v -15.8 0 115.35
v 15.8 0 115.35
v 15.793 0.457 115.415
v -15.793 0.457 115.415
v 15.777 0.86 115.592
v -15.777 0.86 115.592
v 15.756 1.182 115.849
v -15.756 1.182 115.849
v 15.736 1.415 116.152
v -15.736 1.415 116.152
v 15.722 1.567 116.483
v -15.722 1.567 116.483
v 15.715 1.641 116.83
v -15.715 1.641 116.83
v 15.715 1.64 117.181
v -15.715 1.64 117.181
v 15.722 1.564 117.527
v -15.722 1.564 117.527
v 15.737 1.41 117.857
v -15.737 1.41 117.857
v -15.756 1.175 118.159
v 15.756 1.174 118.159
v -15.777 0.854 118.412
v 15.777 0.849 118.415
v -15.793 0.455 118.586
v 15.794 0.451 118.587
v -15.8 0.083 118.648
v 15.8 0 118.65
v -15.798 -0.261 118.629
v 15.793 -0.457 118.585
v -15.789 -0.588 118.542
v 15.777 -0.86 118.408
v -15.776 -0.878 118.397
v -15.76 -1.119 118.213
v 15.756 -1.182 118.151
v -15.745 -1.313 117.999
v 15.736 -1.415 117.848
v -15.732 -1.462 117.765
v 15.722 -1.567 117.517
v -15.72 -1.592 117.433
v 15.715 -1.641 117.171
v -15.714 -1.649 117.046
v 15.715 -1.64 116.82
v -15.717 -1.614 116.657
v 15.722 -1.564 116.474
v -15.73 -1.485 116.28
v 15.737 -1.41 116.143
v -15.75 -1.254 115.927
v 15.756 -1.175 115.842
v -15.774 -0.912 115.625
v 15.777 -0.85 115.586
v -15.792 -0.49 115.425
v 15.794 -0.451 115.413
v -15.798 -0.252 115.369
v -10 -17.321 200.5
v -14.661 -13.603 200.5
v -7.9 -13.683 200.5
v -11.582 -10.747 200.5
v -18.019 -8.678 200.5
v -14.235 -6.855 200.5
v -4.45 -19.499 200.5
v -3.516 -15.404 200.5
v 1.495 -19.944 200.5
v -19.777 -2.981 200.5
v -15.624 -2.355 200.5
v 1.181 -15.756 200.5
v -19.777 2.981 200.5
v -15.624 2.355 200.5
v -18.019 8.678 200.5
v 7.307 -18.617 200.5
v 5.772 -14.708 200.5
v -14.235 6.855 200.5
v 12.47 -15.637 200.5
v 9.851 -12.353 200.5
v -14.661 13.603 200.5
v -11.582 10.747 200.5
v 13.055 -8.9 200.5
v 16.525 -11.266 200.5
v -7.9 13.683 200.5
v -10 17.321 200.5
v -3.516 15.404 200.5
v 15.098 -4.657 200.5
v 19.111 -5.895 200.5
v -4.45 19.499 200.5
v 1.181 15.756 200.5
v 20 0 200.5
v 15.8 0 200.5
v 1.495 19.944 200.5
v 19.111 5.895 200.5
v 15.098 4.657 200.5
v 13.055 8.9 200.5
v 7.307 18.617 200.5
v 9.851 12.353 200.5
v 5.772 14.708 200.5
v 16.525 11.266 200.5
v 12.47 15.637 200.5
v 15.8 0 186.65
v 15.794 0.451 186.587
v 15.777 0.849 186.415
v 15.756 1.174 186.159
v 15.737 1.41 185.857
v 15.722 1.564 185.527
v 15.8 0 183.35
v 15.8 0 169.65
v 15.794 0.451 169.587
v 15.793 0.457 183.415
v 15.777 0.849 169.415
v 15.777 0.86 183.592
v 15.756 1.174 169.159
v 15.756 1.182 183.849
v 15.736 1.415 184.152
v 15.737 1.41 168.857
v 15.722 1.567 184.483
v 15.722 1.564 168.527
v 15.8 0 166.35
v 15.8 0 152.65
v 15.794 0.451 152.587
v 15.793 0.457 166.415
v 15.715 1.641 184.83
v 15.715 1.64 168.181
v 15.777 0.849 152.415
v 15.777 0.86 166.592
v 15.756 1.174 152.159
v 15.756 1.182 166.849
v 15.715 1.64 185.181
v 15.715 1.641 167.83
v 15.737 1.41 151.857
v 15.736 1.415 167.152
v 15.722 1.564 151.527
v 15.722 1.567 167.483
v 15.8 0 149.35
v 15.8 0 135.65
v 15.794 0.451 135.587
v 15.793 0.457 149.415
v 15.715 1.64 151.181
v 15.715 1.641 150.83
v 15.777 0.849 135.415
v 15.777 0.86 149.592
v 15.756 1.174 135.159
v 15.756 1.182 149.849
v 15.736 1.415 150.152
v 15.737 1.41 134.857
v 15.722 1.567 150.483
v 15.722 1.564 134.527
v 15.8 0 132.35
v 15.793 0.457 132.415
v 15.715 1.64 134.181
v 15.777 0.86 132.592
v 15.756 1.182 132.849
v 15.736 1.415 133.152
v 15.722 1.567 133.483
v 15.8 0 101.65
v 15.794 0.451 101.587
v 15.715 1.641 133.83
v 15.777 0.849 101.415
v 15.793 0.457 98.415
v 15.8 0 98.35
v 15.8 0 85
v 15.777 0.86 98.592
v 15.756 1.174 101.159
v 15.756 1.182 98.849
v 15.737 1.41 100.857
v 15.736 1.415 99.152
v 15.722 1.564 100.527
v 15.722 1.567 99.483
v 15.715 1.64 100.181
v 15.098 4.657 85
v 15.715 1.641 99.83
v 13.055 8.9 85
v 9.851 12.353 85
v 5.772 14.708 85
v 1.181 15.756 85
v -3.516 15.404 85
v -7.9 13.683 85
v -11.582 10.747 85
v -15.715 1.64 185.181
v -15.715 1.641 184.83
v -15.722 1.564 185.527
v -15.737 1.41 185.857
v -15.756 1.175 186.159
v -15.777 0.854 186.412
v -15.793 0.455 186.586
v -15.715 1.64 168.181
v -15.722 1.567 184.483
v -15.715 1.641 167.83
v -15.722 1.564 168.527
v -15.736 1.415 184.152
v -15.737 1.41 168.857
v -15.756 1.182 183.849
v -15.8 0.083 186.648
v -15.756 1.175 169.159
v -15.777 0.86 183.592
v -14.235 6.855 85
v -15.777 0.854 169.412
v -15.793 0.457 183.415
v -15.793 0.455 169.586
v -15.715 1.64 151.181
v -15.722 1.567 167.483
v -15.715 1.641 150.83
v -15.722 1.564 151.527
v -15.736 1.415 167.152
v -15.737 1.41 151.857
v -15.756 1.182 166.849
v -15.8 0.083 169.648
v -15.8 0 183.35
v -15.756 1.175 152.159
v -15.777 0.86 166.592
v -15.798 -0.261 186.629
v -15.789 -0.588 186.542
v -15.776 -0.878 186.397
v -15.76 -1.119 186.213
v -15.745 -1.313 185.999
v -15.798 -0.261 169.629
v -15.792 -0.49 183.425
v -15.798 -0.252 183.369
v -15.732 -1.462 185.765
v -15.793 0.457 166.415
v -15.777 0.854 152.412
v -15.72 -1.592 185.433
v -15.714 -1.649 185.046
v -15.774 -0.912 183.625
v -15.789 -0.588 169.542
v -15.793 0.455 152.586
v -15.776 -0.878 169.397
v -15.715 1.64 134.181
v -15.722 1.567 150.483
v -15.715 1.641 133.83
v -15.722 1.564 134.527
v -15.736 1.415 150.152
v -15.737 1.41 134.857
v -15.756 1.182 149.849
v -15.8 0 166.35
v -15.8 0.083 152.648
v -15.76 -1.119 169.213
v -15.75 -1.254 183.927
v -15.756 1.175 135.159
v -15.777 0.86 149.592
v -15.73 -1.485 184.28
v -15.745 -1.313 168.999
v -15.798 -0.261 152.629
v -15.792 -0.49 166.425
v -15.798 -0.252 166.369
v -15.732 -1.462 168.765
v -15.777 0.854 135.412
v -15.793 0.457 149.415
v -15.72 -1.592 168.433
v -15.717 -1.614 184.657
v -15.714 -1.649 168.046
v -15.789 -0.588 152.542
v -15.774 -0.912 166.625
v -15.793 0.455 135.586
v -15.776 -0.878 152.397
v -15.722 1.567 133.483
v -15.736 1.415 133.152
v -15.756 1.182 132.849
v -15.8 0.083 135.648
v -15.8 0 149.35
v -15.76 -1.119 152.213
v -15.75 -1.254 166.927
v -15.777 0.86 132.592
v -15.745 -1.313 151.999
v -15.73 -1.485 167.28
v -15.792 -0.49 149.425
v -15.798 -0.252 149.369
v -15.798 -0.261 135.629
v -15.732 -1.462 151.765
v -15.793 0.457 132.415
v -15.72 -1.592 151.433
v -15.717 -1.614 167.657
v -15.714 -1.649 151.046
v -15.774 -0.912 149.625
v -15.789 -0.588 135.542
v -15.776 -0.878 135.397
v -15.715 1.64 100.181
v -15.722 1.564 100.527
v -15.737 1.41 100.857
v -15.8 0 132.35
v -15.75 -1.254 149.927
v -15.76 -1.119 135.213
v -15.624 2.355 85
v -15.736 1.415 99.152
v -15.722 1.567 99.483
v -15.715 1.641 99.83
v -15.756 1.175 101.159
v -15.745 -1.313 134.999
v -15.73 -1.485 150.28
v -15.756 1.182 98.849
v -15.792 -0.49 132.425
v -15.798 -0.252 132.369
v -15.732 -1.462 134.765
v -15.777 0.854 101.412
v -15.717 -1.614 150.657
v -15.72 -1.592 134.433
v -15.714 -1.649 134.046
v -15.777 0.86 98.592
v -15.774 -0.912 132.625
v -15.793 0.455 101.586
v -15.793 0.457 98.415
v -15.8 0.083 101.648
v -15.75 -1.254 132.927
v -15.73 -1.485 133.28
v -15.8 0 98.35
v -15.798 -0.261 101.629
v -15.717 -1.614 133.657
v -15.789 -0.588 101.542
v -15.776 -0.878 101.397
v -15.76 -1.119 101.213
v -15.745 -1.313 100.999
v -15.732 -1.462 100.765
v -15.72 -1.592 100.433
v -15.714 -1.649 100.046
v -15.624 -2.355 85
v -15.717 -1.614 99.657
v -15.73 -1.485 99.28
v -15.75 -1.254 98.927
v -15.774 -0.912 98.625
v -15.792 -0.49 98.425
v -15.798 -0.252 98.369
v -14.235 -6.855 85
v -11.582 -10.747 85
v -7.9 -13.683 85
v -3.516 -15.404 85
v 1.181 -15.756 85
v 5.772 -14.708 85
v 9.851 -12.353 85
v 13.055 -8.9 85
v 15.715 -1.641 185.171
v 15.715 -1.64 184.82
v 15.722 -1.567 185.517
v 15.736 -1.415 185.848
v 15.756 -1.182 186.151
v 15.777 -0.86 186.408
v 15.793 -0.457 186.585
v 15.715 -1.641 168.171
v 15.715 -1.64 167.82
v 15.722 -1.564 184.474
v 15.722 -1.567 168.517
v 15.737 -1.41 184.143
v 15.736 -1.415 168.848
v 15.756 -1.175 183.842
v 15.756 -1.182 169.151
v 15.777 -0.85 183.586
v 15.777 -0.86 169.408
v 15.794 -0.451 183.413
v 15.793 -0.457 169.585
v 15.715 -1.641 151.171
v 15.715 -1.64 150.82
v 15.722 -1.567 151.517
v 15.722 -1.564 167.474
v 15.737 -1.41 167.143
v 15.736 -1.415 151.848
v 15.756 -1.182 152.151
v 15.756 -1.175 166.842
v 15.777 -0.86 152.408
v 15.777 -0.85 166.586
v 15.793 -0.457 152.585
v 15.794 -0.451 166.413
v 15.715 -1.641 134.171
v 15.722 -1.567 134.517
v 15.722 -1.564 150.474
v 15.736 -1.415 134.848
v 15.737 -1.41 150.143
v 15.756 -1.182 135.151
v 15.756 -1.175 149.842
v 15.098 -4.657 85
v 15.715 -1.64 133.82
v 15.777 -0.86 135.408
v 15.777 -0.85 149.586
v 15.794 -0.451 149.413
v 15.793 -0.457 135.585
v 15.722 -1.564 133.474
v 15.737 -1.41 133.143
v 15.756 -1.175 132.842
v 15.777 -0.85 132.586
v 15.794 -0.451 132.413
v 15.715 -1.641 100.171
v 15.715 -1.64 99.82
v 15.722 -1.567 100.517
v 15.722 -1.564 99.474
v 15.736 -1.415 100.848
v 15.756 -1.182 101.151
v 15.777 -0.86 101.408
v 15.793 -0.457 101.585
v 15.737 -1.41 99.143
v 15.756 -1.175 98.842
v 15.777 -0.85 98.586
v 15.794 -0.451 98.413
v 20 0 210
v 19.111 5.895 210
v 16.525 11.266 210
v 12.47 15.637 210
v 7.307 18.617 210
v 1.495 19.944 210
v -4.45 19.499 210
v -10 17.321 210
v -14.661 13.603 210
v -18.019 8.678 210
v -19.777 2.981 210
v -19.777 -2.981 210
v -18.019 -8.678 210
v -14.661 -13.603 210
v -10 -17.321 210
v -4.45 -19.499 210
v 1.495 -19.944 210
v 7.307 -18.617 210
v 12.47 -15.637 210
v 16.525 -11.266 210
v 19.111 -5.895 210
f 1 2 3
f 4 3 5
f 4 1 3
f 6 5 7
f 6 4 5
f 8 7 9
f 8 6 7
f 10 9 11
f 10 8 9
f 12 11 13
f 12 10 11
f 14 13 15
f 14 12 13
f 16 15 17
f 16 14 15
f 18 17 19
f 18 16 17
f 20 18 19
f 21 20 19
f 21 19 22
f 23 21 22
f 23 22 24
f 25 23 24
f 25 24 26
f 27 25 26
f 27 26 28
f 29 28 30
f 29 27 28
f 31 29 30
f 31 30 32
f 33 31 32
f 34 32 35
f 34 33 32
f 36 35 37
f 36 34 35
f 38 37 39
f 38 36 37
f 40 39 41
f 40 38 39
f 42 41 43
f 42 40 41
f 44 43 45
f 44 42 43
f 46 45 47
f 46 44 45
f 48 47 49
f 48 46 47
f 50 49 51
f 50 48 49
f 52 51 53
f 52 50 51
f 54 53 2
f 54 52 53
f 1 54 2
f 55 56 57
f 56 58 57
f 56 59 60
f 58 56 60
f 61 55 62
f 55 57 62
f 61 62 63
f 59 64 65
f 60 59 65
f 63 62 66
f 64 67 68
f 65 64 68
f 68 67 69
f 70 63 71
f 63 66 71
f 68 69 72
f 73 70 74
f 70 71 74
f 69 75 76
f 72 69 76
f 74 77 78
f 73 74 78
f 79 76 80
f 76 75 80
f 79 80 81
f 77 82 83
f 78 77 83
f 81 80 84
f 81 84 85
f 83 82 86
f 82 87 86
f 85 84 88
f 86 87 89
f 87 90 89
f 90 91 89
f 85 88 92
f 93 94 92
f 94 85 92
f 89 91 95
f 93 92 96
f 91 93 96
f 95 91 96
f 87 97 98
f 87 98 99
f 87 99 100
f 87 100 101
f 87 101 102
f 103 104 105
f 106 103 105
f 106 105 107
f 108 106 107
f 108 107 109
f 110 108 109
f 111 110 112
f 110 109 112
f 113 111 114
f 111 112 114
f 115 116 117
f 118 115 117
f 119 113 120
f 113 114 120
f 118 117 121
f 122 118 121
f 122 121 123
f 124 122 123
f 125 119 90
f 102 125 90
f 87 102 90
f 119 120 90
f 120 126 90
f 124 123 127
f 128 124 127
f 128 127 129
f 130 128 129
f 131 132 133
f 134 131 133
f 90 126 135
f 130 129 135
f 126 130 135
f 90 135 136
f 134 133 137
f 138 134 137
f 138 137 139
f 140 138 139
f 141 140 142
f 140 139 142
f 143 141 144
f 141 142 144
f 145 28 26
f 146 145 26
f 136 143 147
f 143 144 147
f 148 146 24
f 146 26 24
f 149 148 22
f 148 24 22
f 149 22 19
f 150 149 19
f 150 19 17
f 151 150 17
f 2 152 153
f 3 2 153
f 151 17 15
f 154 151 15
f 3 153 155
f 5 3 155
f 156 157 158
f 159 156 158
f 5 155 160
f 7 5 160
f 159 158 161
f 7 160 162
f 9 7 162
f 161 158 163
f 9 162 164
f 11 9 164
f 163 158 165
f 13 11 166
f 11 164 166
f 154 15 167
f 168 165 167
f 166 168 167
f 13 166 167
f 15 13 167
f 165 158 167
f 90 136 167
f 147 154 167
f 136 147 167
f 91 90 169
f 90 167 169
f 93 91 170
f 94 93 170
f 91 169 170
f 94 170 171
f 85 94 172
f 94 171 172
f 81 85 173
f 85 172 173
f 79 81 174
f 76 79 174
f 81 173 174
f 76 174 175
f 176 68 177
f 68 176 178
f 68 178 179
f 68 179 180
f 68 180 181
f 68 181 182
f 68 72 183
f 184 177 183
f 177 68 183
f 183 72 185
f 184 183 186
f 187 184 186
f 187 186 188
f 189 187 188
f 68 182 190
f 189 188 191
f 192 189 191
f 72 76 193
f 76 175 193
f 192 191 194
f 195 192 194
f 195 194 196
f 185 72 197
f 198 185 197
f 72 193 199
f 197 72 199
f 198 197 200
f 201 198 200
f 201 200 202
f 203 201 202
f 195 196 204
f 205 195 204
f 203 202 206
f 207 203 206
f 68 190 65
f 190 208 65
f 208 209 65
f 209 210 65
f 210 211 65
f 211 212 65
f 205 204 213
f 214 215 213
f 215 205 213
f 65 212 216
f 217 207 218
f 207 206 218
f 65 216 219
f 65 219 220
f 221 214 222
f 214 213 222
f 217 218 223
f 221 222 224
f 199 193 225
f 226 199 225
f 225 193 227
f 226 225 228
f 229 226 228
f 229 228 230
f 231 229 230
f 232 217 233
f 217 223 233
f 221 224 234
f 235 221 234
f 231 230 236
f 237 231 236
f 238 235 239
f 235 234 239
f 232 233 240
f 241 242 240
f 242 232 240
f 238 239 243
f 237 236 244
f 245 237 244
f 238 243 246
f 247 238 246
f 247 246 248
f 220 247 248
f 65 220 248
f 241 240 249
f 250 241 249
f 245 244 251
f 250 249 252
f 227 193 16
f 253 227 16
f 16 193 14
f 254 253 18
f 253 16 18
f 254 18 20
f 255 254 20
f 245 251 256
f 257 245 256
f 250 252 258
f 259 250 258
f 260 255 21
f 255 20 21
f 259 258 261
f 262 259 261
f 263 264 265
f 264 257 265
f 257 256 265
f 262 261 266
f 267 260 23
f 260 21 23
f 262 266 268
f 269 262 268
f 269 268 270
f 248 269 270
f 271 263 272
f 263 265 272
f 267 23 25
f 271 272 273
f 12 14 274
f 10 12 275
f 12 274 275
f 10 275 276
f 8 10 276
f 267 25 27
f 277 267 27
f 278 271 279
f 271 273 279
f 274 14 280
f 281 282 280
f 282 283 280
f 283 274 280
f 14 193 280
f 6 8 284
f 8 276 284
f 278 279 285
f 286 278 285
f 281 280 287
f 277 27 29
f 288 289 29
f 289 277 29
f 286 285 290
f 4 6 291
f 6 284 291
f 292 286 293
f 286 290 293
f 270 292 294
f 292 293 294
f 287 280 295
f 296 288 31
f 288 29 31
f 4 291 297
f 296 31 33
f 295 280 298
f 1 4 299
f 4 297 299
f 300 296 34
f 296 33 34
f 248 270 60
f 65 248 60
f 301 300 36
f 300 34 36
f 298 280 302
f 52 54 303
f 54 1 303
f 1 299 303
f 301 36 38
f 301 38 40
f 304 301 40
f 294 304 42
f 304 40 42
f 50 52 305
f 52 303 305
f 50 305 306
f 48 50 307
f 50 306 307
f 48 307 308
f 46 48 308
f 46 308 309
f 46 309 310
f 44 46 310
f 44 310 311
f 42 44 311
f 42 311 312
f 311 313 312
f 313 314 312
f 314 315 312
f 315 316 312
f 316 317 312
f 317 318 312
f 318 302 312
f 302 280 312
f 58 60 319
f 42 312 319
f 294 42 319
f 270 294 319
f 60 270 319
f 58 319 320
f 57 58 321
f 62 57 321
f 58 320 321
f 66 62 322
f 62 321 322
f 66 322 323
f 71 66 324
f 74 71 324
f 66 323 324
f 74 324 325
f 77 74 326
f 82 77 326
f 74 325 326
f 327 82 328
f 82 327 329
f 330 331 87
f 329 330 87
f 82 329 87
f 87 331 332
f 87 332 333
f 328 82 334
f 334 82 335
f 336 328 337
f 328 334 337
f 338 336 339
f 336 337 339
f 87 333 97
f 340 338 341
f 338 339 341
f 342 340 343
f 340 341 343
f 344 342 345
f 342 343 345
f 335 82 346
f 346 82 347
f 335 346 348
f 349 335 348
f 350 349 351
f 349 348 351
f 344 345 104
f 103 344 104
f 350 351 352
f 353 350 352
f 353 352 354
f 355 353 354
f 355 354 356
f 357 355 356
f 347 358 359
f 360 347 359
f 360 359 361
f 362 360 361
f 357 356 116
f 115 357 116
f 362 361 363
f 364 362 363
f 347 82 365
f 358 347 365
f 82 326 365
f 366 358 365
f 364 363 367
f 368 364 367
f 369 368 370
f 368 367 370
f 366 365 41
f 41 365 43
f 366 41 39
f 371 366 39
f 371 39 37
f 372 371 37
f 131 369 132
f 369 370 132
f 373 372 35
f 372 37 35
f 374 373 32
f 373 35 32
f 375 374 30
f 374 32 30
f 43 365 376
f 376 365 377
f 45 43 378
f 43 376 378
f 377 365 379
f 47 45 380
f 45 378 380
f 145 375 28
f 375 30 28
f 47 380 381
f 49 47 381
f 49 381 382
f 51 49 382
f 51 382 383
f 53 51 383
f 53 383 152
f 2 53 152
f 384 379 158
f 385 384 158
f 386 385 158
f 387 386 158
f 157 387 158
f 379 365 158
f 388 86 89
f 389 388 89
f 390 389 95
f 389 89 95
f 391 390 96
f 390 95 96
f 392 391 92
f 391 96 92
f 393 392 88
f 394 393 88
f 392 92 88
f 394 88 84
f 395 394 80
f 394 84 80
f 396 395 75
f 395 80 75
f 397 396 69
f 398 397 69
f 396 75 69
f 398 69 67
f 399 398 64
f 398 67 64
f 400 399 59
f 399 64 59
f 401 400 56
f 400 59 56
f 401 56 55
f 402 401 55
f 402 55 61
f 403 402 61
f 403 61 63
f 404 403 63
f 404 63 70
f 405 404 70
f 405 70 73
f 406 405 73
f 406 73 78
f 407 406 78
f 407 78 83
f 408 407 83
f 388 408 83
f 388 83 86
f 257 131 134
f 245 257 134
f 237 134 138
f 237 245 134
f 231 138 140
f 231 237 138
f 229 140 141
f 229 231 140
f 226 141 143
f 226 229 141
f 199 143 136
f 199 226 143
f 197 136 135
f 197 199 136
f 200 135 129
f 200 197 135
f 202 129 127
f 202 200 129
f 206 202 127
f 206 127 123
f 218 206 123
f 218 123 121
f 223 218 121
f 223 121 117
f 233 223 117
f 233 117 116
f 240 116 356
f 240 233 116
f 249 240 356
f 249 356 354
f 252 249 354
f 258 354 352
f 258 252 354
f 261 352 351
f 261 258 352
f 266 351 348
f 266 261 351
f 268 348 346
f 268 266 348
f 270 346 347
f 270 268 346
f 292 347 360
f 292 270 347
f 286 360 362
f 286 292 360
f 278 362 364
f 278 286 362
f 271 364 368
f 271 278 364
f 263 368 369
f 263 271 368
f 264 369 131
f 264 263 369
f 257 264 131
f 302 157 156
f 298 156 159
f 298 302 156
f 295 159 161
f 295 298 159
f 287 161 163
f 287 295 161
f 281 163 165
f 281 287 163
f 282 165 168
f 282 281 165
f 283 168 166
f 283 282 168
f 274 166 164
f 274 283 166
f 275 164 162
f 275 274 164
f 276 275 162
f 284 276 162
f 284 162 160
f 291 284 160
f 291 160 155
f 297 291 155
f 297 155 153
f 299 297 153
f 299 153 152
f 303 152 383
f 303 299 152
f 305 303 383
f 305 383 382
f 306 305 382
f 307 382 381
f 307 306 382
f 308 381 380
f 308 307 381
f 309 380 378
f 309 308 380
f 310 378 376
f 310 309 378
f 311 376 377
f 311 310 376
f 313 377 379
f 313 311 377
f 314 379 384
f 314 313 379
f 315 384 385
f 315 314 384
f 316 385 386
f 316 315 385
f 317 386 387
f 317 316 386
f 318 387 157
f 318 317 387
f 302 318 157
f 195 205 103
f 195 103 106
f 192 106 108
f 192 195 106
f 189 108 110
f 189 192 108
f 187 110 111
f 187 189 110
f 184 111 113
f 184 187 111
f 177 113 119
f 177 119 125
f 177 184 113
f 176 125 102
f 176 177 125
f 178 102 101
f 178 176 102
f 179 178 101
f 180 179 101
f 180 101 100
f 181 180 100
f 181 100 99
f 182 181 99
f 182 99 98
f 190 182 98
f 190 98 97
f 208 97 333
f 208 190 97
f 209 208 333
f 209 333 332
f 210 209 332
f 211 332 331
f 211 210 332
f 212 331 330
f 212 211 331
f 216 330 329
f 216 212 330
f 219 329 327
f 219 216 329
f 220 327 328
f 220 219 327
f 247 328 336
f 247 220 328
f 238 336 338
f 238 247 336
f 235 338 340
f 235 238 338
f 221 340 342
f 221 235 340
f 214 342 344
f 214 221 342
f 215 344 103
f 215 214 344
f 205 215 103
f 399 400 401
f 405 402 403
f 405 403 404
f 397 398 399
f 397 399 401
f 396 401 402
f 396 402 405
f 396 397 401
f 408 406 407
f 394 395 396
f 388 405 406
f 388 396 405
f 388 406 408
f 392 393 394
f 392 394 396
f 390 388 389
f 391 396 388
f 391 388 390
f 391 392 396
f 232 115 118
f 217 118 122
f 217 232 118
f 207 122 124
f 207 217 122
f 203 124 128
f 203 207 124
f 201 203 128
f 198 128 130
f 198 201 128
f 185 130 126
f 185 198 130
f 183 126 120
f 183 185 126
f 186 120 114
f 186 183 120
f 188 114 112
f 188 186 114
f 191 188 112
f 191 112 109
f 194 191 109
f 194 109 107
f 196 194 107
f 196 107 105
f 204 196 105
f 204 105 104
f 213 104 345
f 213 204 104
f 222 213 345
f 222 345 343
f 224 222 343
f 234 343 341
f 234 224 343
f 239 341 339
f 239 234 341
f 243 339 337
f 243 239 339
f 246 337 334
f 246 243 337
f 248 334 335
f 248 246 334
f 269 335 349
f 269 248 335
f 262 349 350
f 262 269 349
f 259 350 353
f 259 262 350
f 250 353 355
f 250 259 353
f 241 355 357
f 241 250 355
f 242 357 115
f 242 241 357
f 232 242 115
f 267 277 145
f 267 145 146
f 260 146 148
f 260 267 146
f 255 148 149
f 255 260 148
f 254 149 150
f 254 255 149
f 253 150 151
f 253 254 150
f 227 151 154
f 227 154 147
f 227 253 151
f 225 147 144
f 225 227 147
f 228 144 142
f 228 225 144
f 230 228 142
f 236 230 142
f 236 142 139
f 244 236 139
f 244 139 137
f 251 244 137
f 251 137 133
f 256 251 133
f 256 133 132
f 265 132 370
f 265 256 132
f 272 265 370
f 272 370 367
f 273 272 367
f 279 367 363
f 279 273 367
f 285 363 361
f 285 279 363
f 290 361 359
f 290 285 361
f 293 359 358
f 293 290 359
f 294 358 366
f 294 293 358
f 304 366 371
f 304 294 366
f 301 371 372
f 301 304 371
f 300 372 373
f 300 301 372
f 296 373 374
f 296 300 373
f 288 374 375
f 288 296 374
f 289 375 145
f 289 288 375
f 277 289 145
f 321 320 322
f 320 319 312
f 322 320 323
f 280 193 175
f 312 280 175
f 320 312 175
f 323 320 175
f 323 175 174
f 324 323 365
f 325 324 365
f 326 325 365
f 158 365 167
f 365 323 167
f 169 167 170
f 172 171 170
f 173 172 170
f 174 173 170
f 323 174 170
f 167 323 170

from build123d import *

# Parameters (mm, degrees)
CYLINDER017_R     = 15.8
CYLINDER017_DEPTH = 10
CYLINDER018_R     = 20
CYLINDER018_DEPTH = 10
CYLINDER016_R     = 1.65
CYLINDER016_DEPTH = 50
ARRAY002_Z_COUNT  = 6
ARRAY002_Z_PITCH  = 17
CYLINDER020_R     = 1.65
CYLINDER020_DEPTH = 50
CYLINDER015_R     = 1.65
CYLINDER015_DEPTH = 50
CYLINDER019_R     = 20
CYLINDER019_DEPTH = 10
CYLINDER014_R     = 15.8
CYLINDER014_DEPTH = 115


with BuildPart() as cylinder016:
    # Cylinder017 → Cylinder017 (new body)
    with BuildSketch(Plane.XY):
        Circle(CYLINDER017_R)
    extrude(amount=CYLINDER017_DEPTH)


with BuildPart() as cut012:
    # Cylinder018 → Cylinder018 (new body)
    with BuildSketch(Plane.XY):
        Circle(CYLINDER018_R)
    extrude(amount=CYLINDER018_DEPTH)

    # Cut012: cut Cylinder016
    add(cylinder016.part, mode=Mode.SUBTRACT)


with BuildPart() as cut012_1:
    # Cut012 placement: moved
    add(cut012.part.moved(Location((0, 0, 190.5))))


with BuildPart() as array002:
    # Cylinder016 → Cylinder016 (new body)
    with BuildSketch(Plane(origin=(-25, 0, 15), x_dir=(0, 0, -1), z_dir=(1, 0, 0))):
        Circle(CYLINDER016_R)
    extrude(amount=CYLINDER016_DEPTH)

    # Array002 Z: Array002 ×6


with BuildPart() as array002_1:
    add(array002.part)
    with Locations(*[(0, 0, i * ARRAY002_Z_PITCH) for i in range(1, ARRAY002_Z_COUNT)]):
        add(array002.part)


with BuildPart() as array002_2:
    # Array002 placement: moved
    add(array002_1.part.moved(Location((0, 0, 85))))


with BuildPart() as cylinder020:
    # Cylinder020 → Cylinder020 (new body)
    with BuildSketch(Plane(origin=(-25, 0, 15), x_dir=(0, 0, -1), z_dir=(1, 0, 0))):
        Circle(CYLINDER020_R)
    extrude(amount=CYLINDER020_DEPTH)


with BuildPart() as cylinder013:
    # Cylinder015 → Cylinder015 (new body)
    with BuildSketch(Plane(origin=(-25, 0, 100), x_dir=(0, 0, -1), z_dir=(1, 0, 0))):
        Circle(CYLINDER015_R)
    extrude(amount=CYLINDER015_DEPTH)


with BuildPart() as cylinder019:
    # Cylinder019 → Cylinder019 (new body)
    with BuildSketch(Plane.XY.offset(115)):
        Circle(CYLINDER019_R)
    extrude(amount=CYLINDER019_DEPTH)


with BuildPart() as cut011:
    # Cylinder014 → Cylinder014 (new body)
    with BuildSketch(Plane.XY):
        Circle(CYLINDER014_R)
    extrude(amount=CYLINDER014_DEPTH)

    # Fusion002: union Cylinder019
    add(cylinder019.part)

    # Cut013: cut Cylinder013
    add(cylinder013.part, mode=Mode.SUBTRACT)

    # Cut014: cut Cylinder020
    add(cylinder020.part, mode=Mode.SUBTRACT)


with BuildPart() as cut011_1:
    # Cut014 placement: moved
    add(cut011.part.moved(Location((0, 0, 85))))

    # Cut010: cut Array002
    add(array002_2.part, mode=Mode.SUBTRACT)

    # Cut011: cut Cut012
    add(cut012_1.part, mode=Mode.SUBTRACT)


solid = cut011_1.part
